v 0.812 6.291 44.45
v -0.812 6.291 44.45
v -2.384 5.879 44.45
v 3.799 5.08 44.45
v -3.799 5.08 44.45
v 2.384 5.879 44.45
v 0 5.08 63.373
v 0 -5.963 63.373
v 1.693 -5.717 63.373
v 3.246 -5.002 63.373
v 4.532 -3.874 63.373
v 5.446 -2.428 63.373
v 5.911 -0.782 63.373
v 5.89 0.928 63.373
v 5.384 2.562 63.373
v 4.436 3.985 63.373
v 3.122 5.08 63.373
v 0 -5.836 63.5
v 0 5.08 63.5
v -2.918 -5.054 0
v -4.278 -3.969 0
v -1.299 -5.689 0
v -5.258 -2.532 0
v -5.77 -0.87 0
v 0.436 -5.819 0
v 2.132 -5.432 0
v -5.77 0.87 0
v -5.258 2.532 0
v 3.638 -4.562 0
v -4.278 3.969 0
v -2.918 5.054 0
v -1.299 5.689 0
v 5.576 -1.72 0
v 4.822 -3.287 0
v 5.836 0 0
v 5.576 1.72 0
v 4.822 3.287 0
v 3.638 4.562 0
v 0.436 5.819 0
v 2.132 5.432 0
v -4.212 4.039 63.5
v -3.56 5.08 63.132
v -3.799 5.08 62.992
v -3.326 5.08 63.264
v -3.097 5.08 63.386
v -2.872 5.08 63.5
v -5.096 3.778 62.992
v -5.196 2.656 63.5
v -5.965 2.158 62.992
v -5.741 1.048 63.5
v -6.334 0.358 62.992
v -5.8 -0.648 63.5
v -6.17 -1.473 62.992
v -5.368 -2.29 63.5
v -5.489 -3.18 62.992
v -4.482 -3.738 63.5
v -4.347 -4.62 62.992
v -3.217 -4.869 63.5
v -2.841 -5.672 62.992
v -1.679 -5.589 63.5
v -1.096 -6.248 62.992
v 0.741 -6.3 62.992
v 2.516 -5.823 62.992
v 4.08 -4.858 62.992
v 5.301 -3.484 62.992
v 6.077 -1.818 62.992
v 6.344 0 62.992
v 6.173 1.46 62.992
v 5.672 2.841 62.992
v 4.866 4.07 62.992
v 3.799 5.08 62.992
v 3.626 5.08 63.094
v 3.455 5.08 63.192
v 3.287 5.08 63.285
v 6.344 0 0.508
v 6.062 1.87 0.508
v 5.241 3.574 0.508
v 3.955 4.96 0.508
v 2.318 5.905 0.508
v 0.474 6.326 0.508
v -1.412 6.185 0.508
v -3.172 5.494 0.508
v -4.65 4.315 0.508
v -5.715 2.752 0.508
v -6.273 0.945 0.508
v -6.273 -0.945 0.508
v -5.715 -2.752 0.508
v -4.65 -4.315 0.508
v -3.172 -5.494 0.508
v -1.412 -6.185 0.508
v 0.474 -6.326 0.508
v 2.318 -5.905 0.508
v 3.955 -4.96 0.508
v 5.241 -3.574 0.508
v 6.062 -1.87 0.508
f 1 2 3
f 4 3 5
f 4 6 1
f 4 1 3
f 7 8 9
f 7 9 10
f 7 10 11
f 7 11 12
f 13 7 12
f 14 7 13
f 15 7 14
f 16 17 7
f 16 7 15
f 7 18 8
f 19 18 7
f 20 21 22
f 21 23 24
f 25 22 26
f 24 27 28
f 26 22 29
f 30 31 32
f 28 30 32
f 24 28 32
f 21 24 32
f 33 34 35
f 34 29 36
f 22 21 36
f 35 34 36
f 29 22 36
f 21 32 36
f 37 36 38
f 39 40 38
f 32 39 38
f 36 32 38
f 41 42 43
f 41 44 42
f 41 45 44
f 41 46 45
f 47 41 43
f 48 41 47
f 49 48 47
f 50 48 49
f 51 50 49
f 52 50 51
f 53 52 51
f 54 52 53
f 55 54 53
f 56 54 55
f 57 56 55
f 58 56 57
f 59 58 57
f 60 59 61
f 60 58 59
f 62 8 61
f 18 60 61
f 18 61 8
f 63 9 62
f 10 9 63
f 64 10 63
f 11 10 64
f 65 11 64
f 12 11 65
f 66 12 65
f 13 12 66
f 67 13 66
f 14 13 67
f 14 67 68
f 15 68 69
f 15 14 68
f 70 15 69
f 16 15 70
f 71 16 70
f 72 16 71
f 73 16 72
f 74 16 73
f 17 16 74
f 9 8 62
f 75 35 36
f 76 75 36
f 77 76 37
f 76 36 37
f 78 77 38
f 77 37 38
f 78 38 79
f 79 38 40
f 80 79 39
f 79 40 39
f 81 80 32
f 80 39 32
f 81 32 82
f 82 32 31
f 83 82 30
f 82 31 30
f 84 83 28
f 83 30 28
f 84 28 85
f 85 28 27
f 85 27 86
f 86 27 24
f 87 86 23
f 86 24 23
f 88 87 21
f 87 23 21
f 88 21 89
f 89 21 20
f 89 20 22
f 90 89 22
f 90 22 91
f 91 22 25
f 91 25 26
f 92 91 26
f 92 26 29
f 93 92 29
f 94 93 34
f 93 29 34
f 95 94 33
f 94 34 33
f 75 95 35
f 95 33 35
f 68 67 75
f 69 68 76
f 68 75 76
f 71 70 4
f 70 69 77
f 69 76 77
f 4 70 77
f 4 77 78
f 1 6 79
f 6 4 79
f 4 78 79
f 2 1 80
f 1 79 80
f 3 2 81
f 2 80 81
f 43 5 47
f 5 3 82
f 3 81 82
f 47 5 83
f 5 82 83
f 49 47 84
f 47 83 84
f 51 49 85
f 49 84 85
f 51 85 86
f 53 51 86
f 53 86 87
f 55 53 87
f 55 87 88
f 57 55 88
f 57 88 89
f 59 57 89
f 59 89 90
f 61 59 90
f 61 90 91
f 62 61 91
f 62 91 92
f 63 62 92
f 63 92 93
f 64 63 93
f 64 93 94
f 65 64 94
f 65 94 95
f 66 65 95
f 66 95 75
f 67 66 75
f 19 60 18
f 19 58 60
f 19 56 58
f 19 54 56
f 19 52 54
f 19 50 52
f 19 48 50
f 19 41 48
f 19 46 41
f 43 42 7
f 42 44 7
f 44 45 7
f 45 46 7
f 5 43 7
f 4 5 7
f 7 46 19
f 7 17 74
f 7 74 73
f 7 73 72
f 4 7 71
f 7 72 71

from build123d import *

# Parameters (mm, degrees)
SKETCH1_R                     = 6.34365
MAIN_SHAFTBOSS_EXTRUDE1_DEPTH = 63.5
SKETCH2_W                     = 9.398
SKETCH2_H                     = 3.175
SHAFT_FLATCUT_EXTRUDE1_DEPTH  = 19.05
CHAMFER1_SIZE                 = 0.508
SKETCH3_W                     = 7.358407373
SKETCH3_H                     = 13.78482206
FACETARGETCUT_EXTRUDE2_DEPTH  = 0.127


with BuildPart() as part:
    # Sketch1 → Main ShaftBoss-Extrude1 (new body)
    with BuildSketch(Plane.XY):
        Circle(SKETCH1_R)
    extrude(amount=MAIN_SHAFTBOSS_EXTRUDE1_DEPTH)

    # Sketch2 → Shaft FlatCut-Extrude1 (cut)
    with BuildSketch(Plane.XY.offset(63.5)):
        with Locations((0, 6.6675)):
            Rectangle(SKETCH2_W, SKETCH2_H)
    extrude(amount=-SHAFT_FLATCUT_EXTRUDE1_DEPTH, mode=Mode.SUBTRACT)

    # Chamfer1
    chamfer1_edges = [part.edges().sort_by_distance(p)[0] for p in [
        (-6.34365, 0, 0),
        (-2.840755677, -5.672036892, 63.5),
    ]]
    chamfer(chamfer1_edges, length=CHAMFER1_SIZE)

    # Sketch3 → FaceTargetCut-Extrude2 (cut)
    with BuildSketch(Plane.XY.offset(63.5)):
        with Locations((3.679203687, -0.119208367)):
            Rectangle(SKETCH3_W, SKETCH3_H)
    extrude(amount=-FACETARGETCUT_EXTRUDE2_DEPTH, mode=Mode.SUBTRACT)


solid = part.part
